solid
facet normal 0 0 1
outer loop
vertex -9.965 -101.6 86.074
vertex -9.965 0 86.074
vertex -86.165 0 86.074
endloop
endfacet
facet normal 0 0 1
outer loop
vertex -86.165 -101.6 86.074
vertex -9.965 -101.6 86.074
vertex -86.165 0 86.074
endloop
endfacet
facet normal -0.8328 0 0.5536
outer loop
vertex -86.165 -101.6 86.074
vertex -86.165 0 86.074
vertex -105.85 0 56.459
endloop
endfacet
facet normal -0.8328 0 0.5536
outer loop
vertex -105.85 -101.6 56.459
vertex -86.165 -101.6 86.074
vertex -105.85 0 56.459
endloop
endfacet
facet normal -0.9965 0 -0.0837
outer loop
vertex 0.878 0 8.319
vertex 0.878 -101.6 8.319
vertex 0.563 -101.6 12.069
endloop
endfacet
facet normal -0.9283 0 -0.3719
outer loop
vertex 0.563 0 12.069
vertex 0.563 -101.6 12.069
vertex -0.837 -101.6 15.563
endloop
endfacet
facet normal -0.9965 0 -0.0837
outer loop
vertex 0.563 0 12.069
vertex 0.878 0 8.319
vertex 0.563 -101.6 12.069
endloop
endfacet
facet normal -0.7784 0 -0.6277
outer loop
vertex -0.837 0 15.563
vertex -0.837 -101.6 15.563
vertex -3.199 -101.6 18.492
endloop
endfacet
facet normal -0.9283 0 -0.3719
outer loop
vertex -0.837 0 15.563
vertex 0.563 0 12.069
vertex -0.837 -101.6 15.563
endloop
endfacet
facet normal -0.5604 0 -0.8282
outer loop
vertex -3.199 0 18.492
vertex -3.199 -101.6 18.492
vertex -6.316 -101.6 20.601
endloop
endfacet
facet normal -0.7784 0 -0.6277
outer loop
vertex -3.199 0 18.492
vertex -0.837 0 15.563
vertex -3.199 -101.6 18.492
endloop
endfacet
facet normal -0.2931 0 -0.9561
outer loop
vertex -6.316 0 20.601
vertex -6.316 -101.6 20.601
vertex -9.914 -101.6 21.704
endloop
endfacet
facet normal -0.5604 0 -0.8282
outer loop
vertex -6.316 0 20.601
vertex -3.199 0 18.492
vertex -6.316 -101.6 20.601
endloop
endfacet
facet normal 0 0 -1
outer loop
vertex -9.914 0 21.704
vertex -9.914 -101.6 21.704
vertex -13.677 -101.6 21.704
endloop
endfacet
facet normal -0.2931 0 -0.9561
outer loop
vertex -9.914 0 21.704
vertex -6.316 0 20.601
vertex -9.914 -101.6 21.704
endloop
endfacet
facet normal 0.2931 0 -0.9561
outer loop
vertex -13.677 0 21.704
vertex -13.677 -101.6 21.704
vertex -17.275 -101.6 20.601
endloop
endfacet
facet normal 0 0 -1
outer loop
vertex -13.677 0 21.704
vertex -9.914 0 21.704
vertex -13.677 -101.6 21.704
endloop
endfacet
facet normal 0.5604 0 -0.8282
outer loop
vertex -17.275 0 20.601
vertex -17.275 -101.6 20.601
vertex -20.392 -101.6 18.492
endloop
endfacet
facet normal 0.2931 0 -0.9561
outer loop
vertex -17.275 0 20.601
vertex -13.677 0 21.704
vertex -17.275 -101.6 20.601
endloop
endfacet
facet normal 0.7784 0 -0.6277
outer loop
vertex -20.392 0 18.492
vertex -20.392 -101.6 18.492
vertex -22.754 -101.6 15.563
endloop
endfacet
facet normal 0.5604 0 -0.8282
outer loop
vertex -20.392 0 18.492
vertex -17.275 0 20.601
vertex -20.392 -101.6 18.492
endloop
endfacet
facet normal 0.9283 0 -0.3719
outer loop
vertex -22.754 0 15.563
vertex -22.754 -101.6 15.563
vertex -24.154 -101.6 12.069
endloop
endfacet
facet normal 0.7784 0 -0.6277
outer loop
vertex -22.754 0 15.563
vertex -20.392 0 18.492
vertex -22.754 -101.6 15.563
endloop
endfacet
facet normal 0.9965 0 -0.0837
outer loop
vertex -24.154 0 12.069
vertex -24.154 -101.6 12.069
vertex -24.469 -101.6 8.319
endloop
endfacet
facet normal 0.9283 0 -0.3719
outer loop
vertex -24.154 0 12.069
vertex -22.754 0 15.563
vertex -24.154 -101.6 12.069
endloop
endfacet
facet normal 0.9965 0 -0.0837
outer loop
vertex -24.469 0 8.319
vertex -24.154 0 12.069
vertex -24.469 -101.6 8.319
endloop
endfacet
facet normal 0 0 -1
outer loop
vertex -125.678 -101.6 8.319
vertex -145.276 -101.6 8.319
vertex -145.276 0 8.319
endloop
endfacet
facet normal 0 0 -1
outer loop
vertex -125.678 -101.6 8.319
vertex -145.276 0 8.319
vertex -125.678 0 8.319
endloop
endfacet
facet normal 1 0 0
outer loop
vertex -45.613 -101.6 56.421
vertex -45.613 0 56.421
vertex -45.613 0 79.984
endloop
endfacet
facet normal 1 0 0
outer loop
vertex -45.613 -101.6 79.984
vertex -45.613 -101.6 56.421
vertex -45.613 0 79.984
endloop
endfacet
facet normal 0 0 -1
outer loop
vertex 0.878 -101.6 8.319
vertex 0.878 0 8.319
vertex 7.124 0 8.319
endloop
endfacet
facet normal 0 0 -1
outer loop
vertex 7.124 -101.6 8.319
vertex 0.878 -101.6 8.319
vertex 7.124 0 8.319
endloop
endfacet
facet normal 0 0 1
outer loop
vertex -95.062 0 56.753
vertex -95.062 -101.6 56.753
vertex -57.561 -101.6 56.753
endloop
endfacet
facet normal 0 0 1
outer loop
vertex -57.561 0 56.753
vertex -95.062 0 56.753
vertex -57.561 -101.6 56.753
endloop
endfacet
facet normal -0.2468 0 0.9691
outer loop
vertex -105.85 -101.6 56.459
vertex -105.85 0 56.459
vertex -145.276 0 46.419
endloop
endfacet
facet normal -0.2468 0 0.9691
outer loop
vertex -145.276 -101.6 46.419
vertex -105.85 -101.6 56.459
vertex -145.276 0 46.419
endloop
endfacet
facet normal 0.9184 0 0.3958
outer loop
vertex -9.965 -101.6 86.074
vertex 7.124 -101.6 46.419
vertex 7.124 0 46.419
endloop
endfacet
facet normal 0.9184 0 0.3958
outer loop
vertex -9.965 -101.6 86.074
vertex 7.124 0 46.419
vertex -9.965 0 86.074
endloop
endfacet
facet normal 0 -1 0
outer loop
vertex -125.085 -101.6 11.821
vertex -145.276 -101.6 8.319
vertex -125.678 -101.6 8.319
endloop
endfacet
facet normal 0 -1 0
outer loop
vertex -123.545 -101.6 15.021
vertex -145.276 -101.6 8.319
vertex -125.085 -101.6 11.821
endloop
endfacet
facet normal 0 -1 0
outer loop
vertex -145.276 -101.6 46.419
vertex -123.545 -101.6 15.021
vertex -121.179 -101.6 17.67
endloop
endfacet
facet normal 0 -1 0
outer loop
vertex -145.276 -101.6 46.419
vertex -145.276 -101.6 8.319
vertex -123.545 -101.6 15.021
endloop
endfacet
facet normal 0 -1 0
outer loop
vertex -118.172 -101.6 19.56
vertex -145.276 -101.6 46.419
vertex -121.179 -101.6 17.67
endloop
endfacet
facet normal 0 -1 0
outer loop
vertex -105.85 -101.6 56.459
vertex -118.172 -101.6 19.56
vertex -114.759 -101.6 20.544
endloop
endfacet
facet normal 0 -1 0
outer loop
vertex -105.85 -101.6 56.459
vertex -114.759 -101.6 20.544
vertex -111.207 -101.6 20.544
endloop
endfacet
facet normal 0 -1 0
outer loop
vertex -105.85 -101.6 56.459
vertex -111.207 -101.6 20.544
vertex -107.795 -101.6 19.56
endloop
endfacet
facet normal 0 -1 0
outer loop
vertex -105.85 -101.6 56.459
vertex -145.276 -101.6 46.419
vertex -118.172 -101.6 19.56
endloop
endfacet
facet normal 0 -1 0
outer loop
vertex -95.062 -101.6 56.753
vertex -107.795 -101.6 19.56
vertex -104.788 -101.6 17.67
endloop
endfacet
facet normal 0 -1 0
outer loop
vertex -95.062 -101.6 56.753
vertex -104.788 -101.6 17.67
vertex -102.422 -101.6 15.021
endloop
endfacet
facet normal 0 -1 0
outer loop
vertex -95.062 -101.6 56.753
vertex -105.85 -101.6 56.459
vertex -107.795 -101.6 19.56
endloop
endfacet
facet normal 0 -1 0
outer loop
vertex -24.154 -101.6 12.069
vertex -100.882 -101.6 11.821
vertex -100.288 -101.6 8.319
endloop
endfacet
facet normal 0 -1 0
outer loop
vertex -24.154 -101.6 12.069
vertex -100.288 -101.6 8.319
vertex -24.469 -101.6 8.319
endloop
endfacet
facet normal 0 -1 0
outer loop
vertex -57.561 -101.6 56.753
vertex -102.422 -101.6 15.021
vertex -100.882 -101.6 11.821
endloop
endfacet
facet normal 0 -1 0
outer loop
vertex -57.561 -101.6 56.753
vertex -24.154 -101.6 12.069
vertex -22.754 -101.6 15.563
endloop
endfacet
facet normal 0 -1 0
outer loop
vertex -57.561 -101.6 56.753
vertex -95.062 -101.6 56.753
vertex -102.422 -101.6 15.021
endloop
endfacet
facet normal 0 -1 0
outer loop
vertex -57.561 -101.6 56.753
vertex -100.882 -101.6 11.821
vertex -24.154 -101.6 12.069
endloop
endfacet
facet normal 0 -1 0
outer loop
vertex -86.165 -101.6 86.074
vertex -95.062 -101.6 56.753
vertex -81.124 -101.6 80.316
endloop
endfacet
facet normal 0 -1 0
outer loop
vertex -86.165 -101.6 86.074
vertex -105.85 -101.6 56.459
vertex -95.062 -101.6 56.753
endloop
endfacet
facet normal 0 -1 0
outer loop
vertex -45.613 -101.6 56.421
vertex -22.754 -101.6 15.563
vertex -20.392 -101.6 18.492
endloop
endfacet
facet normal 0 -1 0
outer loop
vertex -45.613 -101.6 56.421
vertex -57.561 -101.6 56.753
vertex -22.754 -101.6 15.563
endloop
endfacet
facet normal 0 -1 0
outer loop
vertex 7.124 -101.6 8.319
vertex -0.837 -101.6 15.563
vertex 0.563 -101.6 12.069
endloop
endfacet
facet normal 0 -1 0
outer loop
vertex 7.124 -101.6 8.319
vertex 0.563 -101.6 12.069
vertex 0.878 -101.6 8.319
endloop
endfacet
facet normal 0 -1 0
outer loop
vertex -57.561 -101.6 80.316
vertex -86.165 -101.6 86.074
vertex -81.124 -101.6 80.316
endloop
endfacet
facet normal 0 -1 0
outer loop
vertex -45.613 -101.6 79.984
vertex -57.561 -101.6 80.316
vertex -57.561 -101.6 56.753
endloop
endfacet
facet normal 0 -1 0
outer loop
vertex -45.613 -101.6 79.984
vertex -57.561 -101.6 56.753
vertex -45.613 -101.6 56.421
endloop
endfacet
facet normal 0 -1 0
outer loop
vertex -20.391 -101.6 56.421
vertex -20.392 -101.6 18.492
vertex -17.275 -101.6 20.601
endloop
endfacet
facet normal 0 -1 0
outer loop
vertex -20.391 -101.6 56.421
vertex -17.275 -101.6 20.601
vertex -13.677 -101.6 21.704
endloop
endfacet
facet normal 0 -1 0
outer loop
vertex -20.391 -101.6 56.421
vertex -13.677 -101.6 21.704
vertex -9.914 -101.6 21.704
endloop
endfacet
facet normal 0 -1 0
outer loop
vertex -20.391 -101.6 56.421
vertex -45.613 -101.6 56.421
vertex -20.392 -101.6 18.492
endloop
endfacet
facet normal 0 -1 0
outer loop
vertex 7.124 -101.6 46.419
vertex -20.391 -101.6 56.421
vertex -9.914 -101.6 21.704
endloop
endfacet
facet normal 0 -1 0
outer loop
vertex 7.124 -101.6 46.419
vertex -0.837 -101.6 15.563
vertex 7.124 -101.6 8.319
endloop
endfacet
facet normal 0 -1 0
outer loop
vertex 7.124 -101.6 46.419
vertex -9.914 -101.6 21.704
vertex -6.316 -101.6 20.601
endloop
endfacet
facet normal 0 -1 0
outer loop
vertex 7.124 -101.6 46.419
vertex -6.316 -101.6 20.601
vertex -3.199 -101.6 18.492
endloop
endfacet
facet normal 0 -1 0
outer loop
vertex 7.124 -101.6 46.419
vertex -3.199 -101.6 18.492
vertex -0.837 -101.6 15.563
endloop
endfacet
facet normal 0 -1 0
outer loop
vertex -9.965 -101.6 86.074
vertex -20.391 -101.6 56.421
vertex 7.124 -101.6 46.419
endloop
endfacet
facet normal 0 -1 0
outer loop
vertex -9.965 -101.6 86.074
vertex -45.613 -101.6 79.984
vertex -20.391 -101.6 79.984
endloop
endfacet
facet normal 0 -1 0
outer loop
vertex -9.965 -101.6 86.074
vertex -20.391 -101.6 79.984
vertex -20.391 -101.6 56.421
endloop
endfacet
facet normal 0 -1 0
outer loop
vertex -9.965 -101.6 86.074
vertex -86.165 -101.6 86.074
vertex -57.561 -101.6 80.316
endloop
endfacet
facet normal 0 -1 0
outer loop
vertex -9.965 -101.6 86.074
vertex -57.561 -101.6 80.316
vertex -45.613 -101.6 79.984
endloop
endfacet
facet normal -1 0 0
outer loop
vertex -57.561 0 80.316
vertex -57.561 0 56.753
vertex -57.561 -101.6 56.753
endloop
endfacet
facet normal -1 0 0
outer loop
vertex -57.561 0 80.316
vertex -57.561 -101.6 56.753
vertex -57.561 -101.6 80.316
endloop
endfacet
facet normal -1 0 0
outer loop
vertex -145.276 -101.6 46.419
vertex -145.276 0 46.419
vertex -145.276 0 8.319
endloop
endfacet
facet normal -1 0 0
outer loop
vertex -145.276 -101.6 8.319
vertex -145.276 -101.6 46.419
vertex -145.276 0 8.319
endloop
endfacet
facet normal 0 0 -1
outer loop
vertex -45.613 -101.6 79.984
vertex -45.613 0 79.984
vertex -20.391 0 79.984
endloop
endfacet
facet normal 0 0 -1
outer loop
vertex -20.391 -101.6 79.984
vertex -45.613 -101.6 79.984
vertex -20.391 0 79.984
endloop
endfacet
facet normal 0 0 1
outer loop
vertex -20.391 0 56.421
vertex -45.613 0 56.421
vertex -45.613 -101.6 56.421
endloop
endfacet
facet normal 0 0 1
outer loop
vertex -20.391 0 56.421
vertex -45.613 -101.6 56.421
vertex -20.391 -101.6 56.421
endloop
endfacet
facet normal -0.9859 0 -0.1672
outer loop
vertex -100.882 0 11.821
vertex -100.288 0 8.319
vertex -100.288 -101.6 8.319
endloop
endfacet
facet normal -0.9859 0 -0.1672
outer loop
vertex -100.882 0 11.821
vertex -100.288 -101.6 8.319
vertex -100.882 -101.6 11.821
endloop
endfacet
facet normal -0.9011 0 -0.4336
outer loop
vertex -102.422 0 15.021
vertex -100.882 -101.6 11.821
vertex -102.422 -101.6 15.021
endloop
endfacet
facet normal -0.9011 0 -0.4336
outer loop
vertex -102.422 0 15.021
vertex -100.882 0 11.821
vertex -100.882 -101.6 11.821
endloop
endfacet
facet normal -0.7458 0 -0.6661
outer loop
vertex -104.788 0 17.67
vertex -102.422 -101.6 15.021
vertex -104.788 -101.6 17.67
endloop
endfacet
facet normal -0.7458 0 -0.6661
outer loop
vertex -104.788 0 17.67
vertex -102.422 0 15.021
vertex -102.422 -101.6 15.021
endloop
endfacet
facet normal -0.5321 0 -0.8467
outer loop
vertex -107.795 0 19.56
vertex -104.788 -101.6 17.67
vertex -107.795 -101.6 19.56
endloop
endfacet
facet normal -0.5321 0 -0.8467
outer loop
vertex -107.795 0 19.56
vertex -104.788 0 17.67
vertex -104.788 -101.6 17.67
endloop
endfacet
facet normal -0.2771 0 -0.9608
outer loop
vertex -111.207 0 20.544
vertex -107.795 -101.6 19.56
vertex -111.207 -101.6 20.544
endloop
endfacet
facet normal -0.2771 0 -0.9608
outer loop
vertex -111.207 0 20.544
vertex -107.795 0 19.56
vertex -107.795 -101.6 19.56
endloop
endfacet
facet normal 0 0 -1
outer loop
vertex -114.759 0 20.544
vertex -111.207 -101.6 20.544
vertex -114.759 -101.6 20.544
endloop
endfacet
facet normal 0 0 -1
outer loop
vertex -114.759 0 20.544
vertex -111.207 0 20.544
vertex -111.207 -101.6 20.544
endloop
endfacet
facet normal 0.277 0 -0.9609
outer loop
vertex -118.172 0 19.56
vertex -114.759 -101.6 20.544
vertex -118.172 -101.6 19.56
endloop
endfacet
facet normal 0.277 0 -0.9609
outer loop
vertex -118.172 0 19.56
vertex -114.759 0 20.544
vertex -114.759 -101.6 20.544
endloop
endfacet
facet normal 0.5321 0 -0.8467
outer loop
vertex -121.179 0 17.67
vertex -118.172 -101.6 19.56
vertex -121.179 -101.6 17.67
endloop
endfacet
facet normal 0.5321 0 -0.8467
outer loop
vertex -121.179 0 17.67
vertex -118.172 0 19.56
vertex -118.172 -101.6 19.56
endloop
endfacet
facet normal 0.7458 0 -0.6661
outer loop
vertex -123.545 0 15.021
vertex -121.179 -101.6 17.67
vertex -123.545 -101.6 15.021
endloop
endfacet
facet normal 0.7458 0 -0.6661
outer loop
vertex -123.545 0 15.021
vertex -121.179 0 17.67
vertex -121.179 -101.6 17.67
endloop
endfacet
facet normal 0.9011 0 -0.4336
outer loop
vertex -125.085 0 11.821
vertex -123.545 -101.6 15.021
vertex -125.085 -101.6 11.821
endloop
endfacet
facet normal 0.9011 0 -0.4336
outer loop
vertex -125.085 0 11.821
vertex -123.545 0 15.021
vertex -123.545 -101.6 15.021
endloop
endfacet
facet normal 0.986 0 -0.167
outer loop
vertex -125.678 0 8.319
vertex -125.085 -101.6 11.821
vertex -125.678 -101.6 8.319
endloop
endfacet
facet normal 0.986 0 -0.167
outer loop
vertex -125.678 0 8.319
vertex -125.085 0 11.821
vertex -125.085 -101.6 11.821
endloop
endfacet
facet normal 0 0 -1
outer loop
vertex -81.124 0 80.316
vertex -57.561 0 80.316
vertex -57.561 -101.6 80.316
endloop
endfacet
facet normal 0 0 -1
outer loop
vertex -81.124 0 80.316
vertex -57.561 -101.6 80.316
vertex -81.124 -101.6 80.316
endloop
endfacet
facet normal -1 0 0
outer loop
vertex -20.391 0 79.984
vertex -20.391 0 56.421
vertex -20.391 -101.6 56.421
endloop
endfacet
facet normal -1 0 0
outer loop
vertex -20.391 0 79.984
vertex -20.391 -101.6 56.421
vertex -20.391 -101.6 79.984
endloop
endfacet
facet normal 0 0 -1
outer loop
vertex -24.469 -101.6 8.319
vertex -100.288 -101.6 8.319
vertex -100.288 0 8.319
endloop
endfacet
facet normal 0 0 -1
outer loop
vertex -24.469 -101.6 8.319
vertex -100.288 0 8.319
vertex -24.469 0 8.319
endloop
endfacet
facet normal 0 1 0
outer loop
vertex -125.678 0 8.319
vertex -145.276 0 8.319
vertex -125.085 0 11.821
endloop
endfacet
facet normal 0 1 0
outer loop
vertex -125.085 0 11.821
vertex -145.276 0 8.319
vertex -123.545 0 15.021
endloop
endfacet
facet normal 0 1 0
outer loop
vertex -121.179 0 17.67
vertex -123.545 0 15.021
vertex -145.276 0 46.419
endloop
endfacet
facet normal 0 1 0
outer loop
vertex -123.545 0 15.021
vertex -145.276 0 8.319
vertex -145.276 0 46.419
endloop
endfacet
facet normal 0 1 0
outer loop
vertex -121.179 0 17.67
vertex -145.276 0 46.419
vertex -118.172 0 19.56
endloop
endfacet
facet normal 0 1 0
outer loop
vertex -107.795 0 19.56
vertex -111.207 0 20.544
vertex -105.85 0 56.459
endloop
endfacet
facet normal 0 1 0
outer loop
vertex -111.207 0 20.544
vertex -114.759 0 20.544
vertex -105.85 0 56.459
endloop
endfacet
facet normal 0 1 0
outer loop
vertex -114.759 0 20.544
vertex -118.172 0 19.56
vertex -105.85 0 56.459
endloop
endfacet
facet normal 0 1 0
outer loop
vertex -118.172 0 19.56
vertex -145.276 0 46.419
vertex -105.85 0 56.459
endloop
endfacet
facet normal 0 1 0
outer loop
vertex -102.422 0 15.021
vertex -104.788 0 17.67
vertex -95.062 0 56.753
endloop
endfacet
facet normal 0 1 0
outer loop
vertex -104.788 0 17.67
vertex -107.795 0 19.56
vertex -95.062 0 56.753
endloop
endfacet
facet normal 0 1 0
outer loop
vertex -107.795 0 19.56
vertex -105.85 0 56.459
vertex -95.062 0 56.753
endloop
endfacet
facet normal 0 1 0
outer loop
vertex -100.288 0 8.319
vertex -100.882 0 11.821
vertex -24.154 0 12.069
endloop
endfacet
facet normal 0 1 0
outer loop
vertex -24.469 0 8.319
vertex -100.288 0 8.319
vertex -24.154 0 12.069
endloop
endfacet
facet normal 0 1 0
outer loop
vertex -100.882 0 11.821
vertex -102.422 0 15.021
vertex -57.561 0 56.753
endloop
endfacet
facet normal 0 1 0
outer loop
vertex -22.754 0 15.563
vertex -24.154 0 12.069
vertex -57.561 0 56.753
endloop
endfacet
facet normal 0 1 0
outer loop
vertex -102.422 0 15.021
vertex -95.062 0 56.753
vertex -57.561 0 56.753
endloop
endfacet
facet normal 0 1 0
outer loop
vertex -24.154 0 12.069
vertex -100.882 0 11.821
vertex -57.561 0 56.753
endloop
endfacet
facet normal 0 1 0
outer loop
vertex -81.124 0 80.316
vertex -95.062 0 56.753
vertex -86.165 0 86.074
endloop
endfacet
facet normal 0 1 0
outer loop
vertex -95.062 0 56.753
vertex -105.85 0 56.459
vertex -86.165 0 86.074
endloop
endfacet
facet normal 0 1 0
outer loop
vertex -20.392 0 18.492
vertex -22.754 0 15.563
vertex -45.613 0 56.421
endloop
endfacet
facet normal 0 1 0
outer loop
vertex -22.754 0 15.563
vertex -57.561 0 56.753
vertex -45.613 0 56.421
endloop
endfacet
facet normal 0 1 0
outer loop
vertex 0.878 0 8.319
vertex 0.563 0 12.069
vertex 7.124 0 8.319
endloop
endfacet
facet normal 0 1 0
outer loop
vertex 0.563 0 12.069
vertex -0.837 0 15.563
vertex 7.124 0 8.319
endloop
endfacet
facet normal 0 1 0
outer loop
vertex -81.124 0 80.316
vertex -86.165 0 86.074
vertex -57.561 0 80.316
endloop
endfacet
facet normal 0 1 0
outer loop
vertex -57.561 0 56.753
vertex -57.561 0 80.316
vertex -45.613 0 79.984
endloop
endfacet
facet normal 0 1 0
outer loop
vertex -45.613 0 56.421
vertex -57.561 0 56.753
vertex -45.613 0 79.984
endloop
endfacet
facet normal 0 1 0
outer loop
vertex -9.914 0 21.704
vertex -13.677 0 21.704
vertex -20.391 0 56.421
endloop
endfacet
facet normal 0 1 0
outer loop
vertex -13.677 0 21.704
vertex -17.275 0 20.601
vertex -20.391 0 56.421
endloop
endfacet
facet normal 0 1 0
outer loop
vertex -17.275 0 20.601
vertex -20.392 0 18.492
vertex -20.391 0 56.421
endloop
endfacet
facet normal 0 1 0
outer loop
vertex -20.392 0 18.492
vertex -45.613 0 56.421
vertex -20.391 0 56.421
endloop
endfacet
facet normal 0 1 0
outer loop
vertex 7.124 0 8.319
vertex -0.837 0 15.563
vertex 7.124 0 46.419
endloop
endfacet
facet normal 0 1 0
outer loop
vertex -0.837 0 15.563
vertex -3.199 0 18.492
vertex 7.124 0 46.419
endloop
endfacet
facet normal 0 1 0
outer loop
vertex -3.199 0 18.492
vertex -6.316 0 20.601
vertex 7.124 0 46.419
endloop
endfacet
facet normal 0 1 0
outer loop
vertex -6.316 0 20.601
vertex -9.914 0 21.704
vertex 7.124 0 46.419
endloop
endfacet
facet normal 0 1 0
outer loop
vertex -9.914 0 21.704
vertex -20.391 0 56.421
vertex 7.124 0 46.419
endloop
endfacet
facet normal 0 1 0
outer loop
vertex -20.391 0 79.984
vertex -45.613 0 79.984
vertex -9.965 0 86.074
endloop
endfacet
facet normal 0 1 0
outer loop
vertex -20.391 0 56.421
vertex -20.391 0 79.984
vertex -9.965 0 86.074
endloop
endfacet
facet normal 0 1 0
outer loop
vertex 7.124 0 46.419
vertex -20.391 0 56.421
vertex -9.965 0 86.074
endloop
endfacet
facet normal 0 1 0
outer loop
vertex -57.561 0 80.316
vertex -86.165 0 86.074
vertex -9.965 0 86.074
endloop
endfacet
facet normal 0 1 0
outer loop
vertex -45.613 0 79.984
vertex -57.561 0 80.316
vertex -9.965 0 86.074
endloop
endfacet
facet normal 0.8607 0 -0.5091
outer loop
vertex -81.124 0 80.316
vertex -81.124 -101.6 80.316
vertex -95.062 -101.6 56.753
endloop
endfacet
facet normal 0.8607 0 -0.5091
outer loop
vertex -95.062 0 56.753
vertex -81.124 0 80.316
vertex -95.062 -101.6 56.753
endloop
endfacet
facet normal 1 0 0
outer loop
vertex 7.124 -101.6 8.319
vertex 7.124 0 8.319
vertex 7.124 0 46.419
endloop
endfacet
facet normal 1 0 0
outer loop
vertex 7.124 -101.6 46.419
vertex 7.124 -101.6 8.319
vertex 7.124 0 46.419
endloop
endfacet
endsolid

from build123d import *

# Parameters (mm, degrees)
F1_DEPTH = 101.6
F3_DEPTH = 115.062
F4_W     = 25.222163
F4_H     = 23.562811
F5_DEPTH = 157.988
F6_R     = 12.7
F7_DEPTH = 195.834
F8_R     = 12.7
F9_DEPTH = 145.542


with BuildPart() as f1:
    # F0 (on Front) → F1 (new body)
    with BuildSketch(Plane.XZ):
        Polygon((-105.85011, 56.459235), (-145.276219, 46.419184), (-145.276219, 8.319184), (7.123781, 8.319184), (7.123781, 46.419184), (-9.965162, 86.073698), (-86.165162, 86.073698), align=None)
    extrude(amount=F1_DEPTH)

    # F2 (on Front) → F3 (cut)
    with BuildSketch(Plane.XZ):
        Polygon((-81.123598, 80.316171), (-95.062166, 56.75336), (-57.560787, 56.75336), (-57.560787, 80.316171), align=None)
    extrude(amount=F3_DEPTH, mode=Mode.SUBTRACT)

    # F4 (on Front) → F5 (cut)
    with BuildSketch(Plane.XZ):
        with Locations((-33.002364, 68.202894)):
            Rectangle(F4_W, F4_H)
    extrude(amount=F5_DEPTH, mode=Mode.SUBTRACT)

    # F6 (on Front) → F7 (cut)
    with BuildSketch(Plane.XZ):
        with Locations((-112.983182, 7.968382)):
            Circle(F6_R)
    extrude(amount=F7_DEPTH, mode=Mode.SUBTRACT)

    # F8 (on Front) → F9 (cut)
    with BuildSketch(Plane.XZ):
        with Locations((-11.795502, 9.144407)):
            Circle(F8_R)
    extrude(amount=F9_DEPTH, mode=Mode.SUBTRACT)


solid = f1.part
